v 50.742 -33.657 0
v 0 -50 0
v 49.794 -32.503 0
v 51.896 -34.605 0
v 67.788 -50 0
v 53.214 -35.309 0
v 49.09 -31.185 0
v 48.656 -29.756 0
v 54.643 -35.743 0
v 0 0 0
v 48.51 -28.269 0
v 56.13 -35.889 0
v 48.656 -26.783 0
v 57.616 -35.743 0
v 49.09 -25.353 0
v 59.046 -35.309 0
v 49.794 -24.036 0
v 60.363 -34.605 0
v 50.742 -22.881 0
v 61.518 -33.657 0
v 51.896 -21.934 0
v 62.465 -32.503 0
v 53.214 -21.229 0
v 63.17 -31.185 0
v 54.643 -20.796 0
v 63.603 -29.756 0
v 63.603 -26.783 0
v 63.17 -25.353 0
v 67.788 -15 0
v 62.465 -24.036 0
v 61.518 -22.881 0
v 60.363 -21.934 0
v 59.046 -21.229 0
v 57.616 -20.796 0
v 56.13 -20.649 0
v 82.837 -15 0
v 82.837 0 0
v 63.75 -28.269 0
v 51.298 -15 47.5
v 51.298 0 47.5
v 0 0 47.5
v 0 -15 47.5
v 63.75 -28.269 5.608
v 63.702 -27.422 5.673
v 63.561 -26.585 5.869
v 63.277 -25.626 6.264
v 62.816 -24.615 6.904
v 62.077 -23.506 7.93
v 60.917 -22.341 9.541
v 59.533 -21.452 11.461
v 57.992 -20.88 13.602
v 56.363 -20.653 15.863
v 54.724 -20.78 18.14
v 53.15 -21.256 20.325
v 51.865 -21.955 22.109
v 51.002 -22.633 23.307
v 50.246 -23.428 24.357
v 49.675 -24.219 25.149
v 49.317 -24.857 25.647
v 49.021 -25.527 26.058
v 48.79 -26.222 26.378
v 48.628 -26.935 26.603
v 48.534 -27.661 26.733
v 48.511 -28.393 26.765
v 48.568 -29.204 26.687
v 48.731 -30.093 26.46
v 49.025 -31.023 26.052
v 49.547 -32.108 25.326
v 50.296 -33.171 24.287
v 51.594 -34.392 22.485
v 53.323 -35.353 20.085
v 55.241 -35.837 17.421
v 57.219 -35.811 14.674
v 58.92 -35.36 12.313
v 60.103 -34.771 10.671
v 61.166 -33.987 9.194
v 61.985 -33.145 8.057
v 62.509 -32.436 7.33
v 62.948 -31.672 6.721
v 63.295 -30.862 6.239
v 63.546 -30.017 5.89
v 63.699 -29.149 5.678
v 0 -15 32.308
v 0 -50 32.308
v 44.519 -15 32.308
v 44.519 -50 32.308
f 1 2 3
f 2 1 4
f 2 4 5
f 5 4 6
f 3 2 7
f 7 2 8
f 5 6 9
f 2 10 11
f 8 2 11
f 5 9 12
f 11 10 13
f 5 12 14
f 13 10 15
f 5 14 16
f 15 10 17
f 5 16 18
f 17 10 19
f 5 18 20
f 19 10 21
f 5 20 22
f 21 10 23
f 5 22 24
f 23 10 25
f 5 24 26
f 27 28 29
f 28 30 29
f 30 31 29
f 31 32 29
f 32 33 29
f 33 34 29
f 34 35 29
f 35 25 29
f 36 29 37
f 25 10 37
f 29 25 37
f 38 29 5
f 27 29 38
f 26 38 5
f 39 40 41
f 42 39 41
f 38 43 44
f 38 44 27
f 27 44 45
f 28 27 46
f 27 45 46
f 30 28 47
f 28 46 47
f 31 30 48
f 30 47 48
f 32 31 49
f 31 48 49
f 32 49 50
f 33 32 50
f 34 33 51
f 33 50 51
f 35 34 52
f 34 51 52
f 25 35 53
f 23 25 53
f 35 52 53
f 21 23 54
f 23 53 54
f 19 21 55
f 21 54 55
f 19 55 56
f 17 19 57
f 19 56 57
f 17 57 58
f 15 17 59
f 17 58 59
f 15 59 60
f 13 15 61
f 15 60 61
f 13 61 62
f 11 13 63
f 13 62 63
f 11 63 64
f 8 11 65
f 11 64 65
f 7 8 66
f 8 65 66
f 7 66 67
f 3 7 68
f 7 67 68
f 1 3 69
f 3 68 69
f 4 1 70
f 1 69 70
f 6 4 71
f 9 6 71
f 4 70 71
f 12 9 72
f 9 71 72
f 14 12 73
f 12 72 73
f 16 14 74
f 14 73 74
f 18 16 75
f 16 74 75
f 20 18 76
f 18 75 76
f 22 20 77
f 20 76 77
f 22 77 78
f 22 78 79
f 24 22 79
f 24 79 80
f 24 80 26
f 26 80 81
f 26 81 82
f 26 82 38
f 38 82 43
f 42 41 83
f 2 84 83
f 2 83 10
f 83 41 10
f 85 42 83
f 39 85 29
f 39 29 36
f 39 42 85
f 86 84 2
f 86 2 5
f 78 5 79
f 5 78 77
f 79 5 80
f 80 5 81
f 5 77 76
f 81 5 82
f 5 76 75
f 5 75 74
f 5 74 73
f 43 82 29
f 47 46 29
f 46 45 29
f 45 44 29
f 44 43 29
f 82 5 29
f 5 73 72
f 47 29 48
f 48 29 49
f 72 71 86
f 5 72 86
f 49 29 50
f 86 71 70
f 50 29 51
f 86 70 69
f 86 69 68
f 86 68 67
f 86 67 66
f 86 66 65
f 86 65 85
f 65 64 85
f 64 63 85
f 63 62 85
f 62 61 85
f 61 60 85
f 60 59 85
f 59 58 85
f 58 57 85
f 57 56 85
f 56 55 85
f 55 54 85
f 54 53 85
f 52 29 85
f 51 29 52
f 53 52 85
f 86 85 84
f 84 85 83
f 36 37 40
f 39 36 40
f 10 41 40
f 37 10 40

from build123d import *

# Parameters (mm, degrees)
F1_DEPTH = 50
F3_DEPTH = 15
F4_R     = 7.6198541316
F5_DEPTH = 295


with BuildPart() as f1:
    # F0 (on Front) → F1 (new body)
    with BuildSketch(Plane.XZ):
        Polygon((0, 32.3076955974), (0, 0), (67.7884593606, 0), (44.5192344487, 32.3076955974), align=None)
    extrude(amount=F1_DEPTH)

    # F2 (on Front) → F3 (join)
    with BuildSketch(Plane.XZ):
        Polygon((0, 47.5000031292), (0, 0), (82.8365385532, 0), (51.2980781496, 47.5000031292), align=None)
    extrude(amount=F3_DEPTH)

    # F4 (on Top) → F5 (cut, symmetric)
    with BuildSketch(Plane.XY):
        with Locations((56.1298057437, -28.2692331821)):
            Circle(F4_R)
    extrude(amount=F5_DEPTH, both=True, mode=Mode.SUBTRACT)


solid = f1.part
